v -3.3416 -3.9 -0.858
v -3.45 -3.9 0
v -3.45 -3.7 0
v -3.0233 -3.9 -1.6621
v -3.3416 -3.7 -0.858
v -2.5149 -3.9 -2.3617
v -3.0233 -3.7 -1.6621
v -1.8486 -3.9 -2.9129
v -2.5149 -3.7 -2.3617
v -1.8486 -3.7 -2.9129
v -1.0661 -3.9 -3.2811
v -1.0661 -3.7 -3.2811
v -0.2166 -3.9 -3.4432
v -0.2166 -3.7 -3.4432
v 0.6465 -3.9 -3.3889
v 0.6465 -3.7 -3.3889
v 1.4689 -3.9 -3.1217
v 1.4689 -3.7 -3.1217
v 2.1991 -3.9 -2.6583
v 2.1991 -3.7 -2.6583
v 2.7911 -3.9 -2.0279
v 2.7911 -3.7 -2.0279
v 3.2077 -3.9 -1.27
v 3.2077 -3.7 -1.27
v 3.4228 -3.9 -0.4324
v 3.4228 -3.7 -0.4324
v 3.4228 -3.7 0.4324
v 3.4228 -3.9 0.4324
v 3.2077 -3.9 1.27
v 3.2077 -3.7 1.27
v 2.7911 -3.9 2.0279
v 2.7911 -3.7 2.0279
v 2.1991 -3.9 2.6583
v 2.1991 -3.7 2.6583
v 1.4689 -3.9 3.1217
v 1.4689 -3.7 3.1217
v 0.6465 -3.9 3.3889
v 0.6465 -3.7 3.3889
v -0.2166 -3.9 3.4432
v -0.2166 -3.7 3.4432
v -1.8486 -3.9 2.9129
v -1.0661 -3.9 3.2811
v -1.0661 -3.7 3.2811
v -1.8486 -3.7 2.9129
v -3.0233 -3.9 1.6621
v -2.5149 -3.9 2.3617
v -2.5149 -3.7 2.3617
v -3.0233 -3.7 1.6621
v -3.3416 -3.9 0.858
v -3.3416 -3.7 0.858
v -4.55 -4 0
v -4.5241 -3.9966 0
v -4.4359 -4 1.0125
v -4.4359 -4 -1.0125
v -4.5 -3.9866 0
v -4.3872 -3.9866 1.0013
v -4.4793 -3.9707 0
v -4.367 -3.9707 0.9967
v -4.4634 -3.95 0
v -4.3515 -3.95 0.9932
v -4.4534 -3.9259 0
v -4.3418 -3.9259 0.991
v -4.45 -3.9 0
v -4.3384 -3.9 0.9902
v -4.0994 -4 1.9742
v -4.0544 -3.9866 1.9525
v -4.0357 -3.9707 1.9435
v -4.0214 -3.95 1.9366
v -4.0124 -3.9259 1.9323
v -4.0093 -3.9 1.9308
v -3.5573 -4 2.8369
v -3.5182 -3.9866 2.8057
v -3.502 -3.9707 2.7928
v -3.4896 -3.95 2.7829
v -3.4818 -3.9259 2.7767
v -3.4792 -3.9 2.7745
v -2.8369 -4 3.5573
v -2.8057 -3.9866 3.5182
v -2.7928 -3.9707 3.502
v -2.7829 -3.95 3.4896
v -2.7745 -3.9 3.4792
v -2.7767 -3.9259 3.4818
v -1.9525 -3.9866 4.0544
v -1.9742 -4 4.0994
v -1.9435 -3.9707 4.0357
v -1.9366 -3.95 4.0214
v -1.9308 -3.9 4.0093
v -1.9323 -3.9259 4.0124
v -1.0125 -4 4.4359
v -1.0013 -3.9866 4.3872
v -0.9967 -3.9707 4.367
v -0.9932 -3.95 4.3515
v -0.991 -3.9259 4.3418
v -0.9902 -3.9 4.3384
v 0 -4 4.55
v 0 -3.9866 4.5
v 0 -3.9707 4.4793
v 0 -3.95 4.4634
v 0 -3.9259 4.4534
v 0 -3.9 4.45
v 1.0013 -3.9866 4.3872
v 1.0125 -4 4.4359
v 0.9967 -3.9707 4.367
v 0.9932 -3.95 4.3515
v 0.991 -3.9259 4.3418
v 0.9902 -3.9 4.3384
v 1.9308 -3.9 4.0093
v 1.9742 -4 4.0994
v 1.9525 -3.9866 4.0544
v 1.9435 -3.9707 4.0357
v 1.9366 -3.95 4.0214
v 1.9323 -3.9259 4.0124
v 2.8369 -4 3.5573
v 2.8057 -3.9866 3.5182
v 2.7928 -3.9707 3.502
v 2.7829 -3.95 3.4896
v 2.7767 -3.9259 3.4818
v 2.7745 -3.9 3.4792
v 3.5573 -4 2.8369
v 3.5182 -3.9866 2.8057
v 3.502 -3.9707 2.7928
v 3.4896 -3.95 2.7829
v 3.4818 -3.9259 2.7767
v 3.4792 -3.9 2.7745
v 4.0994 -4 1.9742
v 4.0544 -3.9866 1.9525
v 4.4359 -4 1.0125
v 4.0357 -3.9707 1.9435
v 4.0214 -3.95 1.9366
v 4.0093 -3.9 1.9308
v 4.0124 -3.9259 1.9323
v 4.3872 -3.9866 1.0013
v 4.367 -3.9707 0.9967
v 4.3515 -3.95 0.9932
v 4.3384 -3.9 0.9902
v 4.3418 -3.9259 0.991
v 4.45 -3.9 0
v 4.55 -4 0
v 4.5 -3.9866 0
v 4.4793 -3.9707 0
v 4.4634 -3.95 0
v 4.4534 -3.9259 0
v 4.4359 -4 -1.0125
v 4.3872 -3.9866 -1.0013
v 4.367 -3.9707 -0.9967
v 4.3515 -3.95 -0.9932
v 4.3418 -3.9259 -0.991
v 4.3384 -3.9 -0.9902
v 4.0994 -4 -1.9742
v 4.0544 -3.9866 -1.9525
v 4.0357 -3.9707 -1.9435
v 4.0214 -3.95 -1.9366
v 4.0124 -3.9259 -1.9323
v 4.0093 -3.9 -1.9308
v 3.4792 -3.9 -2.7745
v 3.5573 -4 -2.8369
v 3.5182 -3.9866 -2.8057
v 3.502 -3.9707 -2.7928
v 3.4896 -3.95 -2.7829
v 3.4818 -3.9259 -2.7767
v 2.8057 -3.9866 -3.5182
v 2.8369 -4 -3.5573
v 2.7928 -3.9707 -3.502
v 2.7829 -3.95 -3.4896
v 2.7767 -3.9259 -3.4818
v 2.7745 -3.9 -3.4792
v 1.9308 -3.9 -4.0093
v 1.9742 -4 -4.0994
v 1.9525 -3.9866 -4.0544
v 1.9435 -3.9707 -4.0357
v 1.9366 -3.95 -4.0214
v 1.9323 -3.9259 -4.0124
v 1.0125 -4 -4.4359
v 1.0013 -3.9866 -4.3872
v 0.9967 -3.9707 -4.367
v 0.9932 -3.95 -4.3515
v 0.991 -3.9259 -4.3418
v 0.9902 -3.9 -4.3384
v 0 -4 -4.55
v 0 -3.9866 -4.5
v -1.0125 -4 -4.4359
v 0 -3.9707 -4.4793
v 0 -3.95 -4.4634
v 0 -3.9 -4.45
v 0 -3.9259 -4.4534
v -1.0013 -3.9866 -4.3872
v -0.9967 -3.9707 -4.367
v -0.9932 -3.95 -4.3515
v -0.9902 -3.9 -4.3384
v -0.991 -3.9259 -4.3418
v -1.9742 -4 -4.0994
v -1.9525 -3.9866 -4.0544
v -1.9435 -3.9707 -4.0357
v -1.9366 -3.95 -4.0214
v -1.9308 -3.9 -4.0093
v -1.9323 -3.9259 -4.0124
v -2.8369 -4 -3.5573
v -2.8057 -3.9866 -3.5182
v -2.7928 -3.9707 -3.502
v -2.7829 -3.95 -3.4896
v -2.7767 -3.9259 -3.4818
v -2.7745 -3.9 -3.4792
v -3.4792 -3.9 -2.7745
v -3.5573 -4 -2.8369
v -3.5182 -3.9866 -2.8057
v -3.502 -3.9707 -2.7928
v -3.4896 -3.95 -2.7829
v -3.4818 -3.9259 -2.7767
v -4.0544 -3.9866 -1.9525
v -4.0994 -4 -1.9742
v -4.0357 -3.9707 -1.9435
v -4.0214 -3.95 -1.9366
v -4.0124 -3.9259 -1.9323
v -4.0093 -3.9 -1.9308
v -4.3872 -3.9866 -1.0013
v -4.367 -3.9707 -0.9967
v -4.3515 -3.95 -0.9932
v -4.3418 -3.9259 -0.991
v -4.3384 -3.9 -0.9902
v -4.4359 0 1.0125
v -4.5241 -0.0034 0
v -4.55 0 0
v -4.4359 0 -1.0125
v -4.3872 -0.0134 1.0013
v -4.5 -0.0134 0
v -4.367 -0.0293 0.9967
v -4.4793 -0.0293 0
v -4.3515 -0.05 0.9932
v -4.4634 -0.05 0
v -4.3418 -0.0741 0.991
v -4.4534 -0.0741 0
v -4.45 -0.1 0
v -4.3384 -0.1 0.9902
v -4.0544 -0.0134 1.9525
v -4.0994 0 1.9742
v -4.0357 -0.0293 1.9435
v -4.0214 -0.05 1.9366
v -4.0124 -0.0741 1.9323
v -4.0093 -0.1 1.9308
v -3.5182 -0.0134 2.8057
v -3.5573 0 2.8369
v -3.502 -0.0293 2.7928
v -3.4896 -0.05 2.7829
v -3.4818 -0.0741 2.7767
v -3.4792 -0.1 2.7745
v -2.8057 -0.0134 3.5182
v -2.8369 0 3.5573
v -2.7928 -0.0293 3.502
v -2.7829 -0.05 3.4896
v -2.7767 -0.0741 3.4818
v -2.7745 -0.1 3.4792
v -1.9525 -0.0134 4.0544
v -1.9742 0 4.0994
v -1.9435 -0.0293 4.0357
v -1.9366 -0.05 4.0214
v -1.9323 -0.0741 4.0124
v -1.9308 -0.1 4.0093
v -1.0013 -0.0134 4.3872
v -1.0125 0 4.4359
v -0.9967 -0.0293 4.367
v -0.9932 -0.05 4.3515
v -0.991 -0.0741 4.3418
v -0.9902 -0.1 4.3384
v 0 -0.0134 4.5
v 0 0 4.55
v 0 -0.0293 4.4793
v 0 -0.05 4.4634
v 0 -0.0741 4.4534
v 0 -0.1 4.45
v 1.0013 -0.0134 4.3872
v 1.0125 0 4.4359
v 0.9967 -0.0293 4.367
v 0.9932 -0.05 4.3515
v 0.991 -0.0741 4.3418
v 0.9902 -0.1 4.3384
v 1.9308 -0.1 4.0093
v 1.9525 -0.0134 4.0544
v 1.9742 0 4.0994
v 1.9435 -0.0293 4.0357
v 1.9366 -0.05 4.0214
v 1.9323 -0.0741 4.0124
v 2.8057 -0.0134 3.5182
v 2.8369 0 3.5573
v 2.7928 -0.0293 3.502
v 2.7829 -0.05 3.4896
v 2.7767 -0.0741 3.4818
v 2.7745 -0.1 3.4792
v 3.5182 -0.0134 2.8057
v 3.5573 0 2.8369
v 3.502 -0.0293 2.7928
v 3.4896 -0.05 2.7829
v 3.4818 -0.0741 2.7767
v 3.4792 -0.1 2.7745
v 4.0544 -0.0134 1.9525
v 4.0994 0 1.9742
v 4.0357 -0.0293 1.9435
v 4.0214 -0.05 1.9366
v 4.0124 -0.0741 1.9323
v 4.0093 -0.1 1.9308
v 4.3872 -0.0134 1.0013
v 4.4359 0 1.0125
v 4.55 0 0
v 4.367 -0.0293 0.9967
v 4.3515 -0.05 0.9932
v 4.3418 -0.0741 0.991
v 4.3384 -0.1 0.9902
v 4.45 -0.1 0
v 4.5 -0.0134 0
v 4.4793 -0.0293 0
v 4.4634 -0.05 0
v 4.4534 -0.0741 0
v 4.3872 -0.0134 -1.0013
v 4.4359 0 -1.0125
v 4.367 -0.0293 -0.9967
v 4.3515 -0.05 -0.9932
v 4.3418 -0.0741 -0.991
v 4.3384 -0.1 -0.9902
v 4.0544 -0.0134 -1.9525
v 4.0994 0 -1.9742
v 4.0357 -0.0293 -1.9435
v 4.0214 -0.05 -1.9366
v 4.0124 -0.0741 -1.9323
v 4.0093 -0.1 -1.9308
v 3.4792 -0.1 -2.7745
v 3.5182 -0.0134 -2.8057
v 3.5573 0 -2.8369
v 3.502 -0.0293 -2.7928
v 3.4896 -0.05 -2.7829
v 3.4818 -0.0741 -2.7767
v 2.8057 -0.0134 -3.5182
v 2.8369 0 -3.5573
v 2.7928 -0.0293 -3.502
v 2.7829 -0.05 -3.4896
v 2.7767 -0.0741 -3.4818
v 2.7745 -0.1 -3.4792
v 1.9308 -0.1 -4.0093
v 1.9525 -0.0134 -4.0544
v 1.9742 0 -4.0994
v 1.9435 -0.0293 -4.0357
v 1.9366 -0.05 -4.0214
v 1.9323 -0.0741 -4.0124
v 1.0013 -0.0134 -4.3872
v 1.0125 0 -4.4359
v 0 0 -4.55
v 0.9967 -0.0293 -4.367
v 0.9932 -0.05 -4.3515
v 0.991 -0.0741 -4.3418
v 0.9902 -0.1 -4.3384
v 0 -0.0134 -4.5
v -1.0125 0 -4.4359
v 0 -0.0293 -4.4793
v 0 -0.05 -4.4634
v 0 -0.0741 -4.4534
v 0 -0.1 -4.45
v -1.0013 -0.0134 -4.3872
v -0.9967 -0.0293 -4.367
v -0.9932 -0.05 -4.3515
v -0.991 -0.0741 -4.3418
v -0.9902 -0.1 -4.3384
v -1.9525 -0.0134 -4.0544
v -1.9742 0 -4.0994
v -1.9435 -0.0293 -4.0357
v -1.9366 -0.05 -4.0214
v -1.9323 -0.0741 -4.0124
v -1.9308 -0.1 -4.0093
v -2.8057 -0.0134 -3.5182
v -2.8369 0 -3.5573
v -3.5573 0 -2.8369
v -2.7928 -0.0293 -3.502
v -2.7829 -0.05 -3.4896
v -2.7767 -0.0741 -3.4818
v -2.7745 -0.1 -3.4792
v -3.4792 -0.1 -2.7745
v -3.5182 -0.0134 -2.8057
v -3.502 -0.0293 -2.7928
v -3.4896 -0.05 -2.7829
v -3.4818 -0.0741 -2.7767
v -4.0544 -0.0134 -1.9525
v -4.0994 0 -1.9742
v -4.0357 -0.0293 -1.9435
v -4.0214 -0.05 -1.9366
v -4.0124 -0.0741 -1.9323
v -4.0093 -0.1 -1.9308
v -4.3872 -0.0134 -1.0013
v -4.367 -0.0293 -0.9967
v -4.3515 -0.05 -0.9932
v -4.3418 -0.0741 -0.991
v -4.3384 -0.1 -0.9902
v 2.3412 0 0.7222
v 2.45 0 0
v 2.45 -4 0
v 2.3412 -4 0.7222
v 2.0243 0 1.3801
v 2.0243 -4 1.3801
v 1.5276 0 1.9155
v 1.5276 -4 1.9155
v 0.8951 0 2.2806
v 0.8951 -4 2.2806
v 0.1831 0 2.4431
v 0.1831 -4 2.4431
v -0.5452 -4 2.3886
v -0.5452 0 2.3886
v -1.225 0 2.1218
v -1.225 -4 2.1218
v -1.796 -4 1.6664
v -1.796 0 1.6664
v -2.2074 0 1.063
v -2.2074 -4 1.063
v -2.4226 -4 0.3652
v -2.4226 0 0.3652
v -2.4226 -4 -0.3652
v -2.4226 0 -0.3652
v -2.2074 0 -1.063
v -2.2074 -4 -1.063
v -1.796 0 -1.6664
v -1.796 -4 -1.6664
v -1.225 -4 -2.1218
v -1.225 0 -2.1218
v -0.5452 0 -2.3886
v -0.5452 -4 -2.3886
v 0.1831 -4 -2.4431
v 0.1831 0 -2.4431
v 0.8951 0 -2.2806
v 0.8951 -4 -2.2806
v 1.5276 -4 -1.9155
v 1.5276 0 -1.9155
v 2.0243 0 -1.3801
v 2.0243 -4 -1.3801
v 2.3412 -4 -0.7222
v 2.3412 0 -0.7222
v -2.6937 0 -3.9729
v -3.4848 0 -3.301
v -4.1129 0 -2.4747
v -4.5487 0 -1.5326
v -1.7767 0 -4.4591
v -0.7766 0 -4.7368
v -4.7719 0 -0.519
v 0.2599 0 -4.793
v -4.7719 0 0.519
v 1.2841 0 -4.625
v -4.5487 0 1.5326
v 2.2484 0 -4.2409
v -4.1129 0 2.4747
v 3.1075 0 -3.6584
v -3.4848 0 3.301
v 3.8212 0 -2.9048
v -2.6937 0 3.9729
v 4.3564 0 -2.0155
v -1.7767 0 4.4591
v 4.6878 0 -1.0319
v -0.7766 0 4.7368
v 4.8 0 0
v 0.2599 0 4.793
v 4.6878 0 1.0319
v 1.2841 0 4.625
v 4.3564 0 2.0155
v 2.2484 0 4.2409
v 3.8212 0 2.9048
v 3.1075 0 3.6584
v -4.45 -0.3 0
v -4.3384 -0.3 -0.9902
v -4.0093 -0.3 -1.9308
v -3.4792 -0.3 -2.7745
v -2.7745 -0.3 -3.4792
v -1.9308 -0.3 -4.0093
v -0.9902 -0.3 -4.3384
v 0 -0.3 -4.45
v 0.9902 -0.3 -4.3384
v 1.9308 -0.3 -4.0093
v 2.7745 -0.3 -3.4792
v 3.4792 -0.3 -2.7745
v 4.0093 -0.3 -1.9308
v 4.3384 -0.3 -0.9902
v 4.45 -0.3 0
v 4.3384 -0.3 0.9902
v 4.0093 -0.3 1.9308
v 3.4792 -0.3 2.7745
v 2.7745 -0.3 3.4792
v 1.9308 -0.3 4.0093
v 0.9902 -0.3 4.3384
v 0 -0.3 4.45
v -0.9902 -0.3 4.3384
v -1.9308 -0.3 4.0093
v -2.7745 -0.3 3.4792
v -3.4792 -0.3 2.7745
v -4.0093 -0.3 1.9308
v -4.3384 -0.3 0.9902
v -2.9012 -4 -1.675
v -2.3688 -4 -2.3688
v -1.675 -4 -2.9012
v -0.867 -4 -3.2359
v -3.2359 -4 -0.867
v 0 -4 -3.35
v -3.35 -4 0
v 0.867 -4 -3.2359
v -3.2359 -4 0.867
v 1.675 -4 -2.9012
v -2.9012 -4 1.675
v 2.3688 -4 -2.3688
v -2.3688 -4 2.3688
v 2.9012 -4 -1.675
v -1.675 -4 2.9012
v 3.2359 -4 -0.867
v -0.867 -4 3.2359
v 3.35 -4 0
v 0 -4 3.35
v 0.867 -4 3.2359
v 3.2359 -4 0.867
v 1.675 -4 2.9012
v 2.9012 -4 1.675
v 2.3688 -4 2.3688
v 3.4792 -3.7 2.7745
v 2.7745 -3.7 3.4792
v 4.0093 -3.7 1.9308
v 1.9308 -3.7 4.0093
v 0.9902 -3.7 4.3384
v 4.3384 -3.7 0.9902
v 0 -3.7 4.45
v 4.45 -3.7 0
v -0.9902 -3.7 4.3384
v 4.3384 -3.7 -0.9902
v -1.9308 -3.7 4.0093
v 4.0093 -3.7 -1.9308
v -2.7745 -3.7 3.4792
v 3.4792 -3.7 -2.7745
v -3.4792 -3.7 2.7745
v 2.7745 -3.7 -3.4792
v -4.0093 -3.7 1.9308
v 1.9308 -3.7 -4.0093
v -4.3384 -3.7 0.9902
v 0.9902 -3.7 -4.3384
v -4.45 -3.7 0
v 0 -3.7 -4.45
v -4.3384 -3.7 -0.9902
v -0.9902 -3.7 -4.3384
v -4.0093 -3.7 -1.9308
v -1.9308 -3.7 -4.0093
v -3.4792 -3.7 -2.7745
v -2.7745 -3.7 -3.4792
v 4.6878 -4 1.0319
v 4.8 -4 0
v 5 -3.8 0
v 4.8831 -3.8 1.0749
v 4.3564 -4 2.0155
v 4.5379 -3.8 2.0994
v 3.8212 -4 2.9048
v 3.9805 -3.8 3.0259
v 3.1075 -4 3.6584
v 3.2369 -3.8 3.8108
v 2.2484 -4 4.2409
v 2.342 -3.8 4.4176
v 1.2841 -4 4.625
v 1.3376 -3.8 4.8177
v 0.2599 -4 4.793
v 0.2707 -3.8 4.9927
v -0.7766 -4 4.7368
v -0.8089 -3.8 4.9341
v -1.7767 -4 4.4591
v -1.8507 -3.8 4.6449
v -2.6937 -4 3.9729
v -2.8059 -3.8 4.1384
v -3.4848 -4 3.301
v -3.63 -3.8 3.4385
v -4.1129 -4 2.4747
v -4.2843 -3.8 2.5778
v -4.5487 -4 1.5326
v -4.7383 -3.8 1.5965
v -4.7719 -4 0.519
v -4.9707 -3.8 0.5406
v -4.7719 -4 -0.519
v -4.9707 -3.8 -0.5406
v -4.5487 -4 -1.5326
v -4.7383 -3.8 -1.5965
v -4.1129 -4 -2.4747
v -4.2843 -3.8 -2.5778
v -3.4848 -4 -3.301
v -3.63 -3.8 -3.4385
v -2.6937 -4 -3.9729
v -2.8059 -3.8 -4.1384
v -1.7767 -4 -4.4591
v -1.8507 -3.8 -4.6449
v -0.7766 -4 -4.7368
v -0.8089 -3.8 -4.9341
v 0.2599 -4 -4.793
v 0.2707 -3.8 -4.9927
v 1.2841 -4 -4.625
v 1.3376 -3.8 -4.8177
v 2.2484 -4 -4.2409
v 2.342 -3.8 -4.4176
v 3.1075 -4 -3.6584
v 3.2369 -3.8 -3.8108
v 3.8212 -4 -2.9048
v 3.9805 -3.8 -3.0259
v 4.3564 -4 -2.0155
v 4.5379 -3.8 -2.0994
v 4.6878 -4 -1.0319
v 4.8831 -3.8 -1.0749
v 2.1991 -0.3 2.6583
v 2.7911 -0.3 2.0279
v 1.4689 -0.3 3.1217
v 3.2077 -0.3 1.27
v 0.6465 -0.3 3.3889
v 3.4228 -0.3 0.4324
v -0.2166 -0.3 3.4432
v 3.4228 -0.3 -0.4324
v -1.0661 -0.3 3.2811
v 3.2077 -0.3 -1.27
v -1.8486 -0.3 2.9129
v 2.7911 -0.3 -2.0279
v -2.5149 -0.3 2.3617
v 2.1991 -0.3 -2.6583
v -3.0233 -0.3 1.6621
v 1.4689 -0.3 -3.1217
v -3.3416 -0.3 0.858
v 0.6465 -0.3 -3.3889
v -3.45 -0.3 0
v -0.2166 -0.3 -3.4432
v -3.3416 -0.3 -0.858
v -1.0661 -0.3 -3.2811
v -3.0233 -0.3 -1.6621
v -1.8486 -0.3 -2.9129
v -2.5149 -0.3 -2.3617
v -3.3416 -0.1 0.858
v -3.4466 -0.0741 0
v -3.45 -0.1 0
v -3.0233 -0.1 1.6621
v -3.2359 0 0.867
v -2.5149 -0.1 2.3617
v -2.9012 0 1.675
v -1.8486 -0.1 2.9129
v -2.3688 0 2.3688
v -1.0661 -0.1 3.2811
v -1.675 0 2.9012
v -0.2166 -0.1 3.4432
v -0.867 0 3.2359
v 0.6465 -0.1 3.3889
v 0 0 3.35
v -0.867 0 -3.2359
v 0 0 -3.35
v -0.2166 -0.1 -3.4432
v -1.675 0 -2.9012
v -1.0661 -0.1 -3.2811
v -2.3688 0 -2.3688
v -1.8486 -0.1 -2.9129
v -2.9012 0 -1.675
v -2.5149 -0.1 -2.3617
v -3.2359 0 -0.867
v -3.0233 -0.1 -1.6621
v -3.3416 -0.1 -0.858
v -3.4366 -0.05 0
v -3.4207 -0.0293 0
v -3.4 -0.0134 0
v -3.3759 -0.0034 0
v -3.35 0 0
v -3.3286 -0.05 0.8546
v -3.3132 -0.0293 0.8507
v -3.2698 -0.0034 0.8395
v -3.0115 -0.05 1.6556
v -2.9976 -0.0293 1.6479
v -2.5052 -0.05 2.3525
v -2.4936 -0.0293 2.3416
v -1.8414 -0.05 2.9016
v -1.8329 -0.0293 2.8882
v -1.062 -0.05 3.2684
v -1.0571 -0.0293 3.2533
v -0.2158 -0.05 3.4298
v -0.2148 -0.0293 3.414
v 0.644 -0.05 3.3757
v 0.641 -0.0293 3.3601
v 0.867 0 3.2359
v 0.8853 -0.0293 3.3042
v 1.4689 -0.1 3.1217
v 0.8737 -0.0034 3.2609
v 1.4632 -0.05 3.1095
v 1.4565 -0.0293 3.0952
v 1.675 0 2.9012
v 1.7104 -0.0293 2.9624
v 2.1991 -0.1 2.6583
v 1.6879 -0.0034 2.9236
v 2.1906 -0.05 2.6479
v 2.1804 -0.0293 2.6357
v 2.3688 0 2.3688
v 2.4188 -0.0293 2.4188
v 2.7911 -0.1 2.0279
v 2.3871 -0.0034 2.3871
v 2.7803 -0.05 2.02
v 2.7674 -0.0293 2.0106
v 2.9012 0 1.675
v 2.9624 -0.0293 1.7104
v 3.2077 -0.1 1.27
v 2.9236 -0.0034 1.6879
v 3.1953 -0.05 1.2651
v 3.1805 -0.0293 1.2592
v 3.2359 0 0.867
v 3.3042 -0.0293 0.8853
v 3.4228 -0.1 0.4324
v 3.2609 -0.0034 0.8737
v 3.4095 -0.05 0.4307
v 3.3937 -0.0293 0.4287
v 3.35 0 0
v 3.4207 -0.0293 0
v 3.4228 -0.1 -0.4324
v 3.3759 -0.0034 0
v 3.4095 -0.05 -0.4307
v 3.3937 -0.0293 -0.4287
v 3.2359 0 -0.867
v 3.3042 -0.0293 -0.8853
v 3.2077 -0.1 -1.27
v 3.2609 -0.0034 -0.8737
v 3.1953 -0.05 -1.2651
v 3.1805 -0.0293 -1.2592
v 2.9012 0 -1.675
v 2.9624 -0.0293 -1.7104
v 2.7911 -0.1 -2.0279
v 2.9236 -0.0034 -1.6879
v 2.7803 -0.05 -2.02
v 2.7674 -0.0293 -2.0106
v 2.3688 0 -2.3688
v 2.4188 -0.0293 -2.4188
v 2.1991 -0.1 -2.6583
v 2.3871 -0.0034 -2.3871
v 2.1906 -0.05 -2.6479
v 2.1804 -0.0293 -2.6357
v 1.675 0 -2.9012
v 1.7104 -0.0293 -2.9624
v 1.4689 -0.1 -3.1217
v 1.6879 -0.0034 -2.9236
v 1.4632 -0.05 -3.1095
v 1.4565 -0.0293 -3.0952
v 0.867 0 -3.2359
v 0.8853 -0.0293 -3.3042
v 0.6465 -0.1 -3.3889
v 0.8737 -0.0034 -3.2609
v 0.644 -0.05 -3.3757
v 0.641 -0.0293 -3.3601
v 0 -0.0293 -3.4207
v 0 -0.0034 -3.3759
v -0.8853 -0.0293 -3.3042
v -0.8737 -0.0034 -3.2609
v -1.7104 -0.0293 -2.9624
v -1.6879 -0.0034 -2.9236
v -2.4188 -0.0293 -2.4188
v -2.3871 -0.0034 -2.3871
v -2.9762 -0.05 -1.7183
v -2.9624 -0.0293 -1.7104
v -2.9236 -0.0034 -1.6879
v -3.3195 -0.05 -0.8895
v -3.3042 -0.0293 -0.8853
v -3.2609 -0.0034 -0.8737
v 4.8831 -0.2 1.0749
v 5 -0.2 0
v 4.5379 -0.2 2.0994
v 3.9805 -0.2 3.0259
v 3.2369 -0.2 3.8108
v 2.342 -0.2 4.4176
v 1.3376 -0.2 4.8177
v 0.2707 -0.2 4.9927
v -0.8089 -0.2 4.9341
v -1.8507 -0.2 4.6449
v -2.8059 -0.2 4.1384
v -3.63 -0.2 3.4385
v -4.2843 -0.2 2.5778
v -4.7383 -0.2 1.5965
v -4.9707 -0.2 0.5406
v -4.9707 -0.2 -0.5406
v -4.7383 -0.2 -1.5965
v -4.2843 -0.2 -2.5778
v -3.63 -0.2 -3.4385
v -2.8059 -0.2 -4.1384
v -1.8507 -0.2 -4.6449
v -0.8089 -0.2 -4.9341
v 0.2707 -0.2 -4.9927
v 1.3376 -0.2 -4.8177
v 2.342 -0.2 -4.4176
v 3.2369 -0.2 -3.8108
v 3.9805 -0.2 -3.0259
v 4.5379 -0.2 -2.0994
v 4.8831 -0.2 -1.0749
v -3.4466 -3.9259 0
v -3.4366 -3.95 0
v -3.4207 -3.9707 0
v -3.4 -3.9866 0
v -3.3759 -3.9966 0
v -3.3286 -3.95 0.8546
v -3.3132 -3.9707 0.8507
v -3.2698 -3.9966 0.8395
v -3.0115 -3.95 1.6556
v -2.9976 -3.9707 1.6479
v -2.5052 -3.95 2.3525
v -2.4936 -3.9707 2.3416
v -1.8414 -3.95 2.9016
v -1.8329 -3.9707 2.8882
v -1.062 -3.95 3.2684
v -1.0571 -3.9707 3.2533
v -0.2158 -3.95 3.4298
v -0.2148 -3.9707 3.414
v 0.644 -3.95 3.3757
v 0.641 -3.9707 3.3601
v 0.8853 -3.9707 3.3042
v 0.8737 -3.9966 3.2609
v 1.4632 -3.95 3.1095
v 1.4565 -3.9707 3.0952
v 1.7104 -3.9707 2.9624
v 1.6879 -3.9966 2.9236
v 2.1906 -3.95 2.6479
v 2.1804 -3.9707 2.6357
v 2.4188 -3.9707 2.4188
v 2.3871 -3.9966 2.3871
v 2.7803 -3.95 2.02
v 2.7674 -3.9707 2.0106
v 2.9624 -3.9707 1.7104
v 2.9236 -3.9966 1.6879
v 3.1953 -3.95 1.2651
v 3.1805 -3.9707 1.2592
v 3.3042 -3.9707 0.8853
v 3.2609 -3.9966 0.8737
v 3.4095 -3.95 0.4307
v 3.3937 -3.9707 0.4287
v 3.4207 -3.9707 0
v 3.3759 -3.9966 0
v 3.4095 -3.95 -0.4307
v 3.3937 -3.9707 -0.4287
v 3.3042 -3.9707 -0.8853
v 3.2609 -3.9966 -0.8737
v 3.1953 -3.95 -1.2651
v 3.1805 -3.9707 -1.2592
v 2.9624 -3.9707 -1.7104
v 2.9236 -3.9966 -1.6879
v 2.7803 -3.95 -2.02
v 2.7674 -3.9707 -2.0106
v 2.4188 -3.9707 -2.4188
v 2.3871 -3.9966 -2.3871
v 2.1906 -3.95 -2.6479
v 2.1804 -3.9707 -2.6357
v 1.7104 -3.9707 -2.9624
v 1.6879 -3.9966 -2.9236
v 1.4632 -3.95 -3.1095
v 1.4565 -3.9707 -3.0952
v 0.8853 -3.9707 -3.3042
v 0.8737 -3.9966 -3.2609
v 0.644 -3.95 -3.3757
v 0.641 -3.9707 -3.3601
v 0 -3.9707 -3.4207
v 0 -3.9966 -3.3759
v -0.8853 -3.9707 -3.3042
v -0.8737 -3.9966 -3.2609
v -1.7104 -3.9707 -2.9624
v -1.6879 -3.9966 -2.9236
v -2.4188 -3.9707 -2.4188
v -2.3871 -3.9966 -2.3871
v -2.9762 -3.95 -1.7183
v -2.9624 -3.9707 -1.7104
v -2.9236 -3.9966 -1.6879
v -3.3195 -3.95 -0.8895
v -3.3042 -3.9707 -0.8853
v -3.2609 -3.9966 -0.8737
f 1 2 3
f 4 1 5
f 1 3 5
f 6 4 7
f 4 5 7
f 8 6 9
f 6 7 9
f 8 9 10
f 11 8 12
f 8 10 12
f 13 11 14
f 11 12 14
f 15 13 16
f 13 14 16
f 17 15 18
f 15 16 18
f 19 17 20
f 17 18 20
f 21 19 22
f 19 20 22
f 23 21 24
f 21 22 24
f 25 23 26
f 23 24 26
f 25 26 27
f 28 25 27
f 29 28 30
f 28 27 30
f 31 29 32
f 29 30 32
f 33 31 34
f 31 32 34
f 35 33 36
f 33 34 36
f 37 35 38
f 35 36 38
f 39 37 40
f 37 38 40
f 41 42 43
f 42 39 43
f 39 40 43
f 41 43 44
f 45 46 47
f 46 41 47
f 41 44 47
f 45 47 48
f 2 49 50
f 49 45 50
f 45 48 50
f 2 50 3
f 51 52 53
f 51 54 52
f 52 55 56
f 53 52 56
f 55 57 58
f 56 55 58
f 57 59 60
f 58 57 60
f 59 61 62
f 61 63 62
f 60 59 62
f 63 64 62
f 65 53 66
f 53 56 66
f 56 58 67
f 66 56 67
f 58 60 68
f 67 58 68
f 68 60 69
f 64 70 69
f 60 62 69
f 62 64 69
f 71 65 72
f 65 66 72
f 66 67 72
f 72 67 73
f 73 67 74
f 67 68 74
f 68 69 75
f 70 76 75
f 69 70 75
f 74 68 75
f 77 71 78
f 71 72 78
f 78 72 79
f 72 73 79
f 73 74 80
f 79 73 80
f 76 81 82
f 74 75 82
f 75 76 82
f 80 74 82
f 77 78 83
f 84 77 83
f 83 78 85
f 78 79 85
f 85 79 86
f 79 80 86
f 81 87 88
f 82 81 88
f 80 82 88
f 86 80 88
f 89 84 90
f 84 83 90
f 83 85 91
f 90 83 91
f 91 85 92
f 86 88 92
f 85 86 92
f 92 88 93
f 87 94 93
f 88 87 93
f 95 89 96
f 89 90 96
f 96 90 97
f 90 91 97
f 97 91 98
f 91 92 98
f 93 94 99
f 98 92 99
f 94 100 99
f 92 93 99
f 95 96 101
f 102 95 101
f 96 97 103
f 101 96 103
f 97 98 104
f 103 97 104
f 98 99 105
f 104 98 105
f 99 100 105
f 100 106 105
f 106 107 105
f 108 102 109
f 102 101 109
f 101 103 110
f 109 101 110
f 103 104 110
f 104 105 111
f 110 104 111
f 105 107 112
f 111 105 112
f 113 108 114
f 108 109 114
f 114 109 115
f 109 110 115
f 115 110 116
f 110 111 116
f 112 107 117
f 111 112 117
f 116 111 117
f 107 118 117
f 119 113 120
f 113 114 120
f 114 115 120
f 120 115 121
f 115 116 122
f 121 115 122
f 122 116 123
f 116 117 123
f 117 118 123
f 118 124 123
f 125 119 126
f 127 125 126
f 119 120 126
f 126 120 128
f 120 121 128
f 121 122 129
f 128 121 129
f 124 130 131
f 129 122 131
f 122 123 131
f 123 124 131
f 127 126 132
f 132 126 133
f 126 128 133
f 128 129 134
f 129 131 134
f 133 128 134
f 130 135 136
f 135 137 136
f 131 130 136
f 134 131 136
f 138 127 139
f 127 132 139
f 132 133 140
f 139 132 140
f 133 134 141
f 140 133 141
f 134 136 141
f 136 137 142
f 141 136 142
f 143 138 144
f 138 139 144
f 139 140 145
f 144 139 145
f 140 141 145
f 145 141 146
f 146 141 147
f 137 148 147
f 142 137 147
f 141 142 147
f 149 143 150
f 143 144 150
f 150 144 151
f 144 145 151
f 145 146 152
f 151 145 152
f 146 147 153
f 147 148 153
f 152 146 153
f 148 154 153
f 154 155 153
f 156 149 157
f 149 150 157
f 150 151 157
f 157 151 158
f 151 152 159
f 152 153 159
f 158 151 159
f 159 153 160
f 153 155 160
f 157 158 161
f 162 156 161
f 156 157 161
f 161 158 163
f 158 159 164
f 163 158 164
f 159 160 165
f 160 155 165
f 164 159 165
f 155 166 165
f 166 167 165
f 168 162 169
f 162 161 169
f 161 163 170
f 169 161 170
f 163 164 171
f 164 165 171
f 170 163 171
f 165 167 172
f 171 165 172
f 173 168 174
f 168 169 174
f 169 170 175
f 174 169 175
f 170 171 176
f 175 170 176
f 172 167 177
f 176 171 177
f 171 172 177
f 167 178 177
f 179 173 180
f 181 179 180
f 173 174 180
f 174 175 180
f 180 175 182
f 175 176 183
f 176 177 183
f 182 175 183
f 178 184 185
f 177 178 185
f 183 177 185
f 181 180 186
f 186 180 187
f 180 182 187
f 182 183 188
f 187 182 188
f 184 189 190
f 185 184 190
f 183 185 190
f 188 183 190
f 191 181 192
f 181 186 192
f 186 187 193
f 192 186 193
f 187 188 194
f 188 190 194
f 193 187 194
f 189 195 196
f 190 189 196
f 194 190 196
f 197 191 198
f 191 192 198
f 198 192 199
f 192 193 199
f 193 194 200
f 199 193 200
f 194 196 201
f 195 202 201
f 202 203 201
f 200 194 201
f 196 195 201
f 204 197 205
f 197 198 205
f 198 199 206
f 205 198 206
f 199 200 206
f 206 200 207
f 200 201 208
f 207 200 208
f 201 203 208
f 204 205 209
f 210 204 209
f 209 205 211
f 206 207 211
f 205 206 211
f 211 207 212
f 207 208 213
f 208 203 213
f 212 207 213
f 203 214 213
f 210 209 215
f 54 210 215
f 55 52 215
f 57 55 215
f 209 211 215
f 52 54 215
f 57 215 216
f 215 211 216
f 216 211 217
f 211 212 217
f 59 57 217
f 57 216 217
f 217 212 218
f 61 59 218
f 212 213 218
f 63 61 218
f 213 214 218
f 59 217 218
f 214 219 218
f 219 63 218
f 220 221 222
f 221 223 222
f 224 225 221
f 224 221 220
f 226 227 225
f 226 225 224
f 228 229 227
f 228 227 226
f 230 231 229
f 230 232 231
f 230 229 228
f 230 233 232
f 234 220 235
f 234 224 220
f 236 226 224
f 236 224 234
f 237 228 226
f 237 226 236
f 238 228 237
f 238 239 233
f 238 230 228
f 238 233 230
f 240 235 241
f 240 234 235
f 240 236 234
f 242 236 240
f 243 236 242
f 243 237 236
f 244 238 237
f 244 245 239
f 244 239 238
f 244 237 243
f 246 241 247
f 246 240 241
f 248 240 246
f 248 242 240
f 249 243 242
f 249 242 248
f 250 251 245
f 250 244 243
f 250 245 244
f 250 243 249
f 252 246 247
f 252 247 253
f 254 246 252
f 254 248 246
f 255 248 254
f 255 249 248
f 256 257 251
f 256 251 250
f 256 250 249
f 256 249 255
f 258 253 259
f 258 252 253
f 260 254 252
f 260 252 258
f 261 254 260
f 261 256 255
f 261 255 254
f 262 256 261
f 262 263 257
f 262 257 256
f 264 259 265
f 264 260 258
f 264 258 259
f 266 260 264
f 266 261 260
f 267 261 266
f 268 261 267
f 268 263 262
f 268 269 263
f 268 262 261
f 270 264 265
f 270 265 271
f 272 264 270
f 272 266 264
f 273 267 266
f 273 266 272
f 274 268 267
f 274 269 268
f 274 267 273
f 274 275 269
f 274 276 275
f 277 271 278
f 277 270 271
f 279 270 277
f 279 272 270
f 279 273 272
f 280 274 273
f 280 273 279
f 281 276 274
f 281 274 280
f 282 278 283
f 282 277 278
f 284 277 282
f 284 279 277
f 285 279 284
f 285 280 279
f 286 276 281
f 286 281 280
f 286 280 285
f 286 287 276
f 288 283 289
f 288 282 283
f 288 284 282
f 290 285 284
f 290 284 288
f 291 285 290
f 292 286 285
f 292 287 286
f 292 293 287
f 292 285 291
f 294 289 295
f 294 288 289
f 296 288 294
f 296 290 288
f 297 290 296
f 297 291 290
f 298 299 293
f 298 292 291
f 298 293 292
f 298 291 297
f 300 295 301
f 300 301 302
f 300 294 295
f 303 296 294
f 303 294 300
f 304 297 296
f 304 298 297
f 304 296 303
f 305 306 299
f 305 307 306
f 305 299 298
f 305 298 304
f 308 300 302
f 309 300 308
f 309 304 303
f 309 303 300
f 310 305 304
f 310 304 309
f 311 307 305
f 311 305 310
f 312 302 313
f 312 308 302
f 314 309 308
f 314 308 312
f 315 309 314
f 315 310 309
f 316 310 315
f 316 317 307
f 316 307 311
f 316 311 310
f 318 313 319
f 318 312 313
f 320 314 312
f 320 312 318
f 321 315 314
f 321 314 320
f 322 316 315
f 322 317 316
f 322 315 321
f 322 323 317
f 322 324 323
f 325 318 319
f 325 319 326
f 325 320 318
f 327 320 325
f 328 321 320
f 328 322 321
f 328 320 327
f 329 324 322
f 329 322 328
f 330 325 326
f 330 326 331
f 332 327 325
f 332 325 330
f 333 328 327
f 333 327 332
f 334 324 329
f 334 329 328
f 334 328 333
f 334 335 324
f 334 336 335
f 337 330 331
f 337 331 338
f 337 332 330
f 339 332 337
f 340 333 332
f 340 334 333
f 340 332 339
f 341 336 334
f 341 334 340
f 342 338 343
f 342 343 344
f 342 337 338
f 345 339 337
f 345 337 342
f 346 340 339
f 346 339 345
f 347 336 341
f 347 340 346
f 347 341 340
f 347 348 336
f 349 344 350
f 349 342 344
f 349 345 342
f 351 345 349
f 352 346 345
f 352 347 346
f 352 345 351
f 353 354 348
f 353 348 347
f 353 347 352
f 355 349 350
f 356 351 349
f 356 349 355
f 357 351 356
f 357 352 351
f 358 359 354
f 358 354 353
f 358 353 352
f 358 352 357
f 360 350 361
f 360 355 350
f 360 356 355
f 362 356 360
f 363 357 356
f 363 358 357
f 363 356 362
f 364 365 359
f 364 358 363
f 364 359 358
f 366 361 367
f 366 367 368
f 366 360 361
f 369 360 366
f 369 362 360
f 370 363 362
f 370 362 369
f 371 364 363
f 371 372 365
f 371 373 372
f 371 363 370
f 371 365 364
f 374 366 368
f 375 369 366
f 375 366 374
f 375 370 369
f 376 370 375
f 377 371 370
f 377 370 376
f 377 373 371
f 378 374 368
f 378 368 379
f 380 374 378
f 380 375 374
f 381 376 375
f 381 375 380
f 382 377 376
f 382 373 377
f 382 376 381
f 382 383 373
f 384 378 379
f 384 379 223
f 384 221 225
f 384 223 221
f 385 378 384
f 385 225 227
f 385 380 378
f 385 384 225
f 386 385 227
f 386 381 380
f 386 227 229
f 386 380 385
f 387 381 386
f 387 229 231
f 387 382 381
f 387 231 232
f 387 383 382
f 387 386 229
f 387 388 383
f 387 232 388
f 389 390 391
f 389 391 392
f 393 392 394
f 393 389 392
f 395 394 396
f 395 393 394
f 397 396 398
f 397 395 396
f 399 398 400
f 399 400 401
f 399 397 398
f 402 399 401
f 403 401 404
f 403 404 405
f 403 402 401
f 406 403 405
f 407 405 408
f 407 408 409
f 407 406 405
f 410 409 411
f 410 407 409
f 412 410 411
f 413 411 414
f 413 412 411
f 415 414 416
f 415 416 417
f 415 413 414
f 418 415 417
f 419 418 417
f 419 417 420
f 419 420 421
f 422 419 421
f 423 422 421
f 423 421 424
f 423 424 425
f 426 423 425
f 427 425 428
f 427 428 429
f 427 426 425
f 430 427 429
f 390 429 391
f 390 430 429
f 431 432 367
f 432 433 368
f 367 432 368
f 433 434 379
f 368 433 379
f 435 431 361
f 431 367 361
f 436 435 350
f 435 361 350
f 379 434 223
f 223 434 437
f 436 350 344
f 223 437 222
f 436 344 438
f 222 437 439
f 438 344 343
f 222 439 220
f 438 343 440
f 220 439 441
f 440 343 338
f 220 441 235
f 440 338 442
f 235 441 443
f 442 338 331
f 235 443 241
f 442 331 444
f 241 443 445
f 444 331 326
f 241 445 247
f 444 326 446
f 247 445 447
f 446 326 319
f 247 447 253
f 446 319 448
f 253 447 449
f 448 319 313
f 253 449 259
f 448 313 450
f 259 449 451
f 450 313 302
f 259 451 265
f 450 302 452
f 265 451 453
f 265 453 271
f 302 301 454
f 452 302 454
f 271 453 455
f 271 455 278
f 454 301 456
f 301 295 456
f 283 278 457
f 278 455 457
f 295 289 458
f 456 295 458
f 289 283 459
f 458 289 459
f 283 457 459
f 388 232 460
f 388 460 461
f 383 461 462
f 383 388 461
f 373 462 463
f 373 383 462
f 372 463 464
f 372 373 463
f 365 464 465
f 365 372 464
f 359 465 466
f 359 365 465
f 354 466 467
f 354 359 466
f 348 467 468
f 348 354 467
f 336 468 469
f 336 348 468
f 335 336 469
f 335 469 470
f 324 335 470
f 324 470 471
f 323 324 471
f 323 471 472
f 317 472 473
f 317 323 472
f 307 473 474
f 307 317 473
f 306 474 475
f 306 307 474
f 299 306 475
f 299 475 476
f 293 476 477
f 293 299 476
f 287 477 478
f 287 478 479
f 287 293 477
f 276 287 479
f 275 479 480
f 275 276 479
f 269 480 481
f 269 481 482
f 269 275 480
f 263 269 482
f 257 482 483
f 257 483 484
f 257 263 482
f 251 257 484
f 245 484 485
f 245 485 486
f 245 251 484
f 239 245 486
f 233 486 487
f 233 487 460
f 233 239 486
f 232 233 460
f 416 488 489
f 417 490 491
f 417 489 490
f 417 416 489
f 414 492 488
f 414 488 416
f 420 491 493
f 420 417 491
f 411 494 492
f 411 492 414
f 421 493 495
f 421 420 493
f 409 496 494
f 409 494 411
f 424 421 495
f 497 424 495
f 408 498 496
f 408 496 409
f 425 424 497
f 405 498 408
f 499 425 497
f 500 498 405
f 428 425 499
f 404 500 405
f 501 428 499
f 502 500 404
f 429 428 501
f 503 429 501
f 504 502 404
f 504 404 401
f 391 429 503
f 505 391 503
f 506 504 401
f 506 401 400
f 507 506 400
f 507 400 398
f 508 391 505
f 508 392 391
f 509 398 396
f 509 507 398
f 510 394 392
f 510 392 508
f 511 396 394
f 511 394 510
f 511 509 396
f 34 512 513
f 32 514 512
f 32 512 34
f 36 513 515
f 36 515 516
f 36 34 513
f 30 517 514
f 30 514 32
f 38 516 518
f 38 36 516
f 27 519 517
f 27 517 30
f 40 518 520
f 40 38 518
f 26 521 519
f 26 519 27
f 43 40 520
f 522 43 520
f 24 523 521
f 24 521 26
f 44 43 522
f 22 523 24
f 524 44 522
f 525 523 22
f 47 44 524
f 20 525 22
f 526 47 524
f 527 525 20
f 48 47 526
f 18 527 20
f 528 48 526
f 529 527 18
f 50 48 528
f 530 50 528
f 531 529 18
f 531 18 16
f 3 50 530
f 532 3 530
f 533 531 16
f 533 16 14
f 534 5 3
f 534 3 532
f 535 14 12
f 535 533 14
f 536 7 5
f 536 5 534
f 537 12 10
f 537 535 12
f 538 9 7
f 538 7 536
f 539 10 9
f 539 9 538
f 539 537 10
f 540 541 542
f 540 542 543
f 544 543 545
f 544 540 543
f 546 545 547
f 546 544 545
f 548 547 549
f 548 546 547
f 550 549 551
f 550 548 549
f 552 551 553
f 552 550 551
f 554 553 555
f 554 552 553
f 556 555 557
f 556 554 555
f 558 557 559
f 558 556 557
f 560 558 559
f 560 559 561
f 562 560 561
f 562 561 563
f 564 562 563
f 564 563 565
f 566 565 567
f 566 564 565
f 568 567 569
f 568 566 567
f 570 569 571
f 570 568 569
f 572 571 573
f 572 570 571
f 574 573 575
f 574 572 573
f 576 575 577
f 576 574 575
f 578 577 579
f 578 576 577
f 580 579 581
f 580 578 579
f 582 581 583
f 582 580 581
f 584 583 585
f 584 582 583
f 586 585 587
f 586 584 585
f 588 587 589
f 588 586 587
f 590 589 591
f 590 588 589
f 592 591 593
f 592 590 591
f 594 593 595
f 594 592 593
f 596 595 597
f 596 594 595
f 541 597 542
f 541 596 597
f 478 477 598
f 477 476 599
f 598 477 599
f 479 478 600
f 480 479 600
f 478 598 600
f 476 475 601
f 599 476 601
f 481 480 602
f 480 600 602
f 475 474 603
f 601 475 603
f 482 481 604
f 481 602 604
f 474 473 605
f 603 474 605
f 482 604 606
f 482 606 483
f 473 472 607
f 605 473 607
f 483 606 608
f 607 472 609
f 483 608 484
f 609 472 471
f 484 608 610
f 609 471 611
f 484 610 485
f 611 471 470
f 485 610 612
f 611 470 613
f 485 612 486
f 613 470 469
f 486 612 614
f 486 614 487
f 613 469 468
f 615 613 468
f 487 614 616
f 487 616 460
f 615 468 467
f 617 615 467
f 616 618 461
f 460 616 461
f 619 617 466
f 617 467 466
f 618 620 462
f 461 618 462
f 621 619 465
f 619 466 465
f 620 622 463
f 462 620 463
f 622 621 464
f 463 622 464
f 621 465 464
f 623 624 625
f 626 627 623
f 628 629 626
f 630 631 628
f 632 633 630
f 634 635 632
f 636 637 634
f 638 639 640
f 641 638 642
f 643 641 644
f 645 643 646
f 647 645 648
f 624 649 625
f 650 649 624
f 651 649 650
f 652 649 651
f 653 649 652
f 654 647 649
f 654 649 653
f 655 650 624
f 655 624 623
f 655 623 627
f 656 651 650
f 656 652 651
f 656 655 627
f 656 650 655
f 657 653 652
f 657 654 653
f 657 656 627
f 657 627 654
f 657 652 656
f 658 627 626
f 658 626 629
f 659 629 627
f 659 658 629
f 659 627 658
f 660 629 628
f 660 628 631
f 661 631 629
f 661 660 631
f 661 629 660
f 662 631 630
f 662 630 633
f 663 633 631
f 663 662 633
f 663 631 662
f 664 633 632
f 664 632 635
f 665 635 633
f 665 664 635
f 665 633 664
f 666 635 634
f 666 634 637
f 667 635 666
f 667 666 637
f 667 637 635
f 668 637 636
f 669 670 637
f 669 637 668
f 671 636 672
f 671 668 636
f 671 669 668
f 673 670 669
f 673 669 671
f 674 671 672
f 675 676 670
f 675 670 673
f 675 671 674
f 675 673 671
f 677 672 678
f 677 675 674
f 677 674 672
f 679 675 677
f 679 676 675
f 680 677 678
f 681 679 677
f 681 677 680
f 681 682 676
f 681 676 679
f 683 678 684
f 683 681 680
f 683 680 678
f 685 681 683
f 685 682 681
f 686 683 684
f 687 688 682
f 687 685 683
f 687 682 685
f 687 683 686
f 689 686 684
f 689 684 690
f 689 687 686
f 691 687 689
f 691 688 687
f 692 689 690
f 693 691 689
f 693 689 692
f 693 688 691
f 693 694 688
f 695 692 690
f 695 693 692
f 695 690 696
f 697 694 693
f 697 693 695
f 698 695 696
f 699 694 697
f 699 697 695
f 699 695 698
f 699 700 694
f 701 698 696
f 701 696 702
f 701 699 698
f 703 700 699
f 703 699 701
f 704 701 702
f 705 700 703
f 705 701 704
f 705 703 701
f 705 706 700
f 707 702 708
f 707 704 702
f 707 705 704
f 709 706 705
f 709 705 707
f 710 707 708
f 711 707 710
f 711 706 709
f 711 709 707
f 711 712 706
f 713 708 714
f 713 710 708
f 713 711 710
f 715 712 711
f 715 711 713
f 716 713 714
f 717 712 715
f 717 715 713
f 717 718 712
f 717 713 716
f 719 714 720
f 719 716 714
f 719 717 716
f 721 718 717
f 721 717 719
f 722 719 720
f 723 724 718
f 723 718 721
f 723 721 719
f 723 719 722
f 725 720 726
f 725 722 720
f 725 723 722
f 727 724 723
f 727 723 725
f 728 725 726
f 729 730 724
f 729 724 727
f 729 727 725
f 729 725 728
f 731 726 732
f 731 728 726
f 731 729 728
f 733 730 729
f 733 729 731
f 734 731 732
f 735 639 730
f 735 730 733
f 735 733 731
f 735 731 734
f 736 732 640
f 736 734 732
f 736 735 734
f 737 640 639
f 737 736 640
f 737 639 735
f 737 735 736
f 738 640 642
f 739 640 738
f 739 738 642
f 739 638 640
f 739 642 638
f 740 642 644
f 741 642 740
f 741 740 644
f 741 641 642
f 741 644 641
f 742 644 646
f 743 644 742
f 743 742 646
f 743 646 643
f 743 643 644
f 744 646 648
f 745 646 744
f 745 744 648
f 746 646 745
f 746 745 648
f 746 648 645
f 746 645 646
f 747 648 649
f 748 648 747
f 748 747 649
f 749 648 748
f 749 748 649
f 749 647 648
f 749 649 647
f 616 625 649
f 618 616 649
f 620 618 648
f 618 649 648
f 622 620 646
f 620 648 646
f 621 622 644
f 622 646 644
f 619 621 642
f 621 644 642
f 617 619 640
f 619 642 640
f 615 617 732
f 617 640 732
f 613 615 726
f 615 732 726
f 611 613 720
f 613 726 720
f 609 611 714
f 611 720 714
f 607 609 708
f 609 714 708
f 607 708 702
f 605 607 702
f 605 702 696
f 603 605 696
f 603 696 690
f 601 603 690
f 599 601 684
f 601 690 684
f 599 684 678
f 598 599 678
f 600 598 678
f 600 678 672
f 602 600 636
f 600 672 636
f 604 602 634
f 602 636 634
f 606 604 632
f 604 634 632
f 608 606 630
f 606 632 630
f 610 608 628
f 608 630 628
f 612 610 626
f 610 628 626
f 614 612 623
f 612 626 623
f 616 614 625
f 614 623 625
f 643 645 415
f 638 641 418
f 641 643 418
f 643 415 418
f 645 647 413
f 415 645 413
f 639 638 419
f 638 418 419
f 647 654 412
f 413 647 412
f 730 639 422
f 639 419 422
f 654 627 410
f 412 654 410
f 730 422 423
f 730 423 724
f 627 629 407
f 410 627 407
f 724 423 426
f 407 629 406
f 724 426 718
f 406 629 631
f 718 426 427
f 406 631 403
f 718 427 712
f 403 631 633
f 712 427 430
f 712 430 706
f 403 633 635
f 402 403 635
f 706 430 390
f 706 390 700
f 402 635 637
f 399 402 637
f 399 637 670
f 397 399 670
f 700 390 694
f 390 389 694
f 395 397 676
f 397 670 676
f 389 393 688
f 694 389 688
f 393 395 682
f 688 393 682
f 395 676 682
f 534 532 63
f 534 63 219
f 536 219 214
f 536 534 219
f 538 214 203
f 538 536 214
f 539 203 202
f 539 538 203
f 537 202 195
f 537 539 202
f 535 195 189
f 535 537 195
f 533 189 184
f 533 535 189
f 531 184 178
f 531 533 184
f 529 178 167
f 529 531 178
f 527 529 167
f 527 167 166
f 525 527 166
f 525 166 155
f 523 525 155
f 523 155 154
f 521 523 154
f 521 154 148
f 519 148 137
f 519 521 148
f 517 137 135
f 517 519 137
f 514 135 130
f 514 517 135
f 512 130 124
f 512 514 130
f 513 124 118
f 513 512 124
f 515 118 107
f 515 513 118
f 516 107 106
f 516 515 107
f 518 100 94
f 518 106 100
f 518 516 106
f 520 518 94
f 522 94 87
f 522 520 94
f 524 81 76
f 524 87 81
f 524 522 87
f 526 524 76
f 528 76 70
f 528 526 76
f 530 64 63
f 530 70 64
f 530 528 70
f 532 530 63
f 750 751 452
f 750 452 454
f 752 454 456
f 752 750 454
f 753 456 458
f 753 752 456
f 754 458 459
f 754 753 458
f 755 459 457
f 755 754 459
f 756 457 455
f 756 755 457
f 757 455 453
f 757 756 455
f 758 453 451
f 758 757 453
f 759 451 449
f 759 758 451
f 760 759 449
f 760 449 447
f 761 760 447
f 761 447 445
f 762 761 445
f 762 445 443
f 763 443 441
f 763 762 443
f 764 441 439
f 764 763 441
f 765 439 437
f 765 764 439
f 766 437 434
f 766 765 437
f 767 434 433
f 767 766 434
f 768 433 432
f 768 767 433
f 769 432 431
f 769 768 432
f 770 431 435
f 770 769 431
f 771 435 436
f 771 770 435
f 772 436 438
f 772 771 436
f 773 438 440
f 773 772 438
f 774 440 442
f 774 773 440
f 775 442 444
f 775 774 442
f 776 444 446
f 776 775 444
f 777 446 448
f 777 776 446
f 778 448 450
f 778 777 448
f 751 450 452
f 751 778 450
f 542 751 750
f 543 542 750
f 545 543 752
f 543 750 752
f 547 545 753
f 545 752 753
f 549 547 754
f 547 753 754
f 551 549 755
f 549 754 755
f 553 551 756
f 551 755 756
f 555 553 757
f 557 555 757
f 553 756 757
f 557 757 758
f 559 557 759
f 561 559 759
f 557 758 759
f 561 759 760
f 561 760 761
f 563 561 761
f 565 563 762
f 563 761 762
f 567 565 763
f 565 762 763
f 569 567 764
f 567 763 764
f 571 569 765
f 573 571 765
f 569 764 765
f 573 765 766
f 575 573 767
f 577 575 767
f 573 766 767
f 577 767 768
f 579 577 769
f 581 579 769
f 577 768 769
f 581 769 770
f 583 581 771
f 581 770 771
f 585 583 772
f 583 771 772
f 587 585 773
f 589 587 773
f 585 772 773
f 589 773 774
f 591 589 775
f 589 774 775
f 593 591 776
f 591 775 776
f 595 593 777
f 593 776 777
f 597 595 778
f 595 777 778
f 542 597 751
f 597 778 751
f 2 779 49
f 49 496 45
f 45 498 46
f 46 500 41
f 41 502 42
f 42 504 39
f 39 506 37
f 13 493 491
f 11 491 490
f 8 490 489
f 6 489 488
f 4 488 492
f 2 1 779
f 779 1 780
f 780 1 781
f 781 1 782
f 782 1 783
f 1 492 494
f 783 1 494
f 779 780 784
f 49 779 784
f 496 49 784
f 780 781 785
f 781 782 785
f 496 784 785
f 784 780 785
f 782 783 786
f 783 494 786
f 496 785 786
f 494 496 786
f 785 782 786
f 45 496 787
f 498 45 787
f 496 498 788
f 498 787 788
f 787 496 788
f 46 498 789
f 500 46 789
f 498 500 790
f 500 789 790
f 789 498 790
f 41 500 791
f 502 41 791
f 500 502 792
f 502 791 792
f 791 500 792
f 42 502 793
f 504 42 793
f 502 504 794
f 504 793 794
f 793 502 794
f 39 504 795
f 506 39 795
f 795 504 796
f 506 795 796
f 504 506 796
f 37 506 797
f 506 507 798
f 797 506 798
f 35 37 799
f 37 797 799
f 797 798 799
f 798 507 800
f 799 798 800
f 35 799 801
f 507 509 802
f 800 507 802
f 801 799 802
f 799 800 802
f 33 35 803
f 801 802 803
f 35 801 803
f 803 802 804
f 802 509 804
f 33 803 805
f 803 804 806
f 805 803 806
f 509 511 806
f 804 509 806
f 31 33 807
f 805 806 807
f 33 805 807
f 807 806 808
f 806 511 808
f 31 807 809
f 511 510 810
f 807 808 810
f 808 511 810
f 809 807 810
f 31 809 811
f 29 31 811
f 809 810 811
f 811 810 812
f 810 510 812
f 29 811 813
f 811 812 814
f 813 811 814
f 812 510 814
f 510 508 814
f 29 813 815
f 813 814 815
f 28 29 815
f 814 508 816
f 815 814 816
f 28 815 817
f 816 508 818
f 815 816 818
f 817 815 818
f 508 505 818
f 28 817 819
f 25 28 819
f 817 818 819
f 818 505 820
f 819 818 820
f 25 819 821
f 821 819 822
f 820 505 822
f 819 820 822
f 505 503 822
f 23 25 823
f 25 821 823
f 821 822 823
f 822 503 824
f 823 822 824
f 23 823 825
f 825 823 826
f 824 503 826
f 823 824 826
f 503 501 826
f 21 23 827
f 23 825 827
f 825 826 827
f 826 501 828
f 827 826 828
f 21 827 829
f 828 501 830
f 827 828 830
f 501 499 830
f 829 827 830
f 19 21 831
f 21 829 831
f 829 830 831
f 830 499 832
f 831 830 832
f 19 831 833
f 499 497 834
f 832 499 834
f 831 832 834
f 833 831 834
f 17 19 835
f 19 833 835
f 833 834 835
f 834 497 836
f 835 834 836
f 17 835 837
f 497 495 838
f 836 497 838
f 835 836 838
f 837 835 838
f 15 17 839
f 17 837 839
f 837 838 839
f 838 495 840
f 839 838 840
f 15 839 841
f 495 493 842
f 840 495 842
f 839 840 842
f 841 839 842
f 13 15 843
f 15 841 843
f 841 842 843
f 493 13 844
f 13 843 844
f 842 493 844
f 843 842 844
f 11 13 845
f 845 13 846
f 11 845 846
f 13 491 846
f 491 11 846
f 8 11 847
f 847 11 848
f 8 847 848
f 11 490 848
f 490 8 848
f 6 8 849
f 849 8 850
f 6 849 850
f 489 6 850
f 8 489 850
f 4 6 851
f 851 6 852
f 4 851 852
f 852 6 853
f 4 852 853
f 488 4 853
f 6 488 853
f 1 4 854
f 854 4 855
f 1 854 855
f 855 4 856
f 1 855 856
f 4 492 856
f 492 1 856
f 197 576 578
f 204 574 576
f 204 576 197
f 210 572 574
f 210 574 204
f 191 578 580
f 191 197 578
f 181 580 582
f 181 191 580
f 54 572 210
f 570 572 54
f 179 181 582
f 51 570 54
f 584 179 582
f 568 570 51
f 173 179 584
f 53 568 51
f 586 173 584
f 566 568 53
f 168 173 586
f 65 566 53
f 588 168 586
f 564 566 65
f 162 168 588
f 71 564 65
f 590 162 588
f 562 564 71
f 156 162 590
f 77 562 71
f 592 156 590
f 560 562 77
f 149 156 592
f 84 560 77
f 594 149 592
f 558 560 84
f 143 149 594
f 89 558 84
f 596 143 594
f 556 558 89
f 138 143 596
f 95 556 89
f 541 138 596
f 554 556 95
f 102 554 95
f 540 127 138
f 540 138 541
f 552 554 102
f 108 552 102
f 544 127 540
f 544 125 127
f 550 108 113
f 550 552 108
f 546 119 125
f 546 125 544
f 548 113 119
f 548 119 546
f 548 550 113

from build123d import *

# Parameters (mm, degrees)
F0_R     = 5
F0_R_2   = 2.45
F1_DEPTH = 4
F3_W     = 1
F3_H     = 1
F5_R     = 0.1
F6_SIZE  = 0.2


with BuildPart() as f1:
    # F0 (on Front) → F1 (new body)
    with BuildSketch(Plane.XZ):
        Circle(F0_R)
        Circle(F0_R_2, mode=Mode.SUBTRACT)
    extrude(amount=F1_DEPTH)

    # F3 (on Top) → F4 (revolve, cut)
    with BuildSketch(Plane.XY):
        with Locations((-3.95, 0.2)):
            Rectangle(F3_W, F3_H)
        with Locations((-3.95, -4.2)):
            Rectangle(F3_W, F3_H)
    revolve(axis=Axis((0, -5.5422200821, 0), (0, -1, 0)), mode=Mode.SUBTRACT)

    # F5
    f5_edges = [f1.edges().sort_by_distance(p)[0] for p in [
        (4.45, 0, 0),
        (3.45, 0, 0),
        (4.45, -4, 0),
        (3.45, -4, 0),
    ]]
    fillet(f5_edges, radius=F5_R)

    # F6
    f6_edges = [f1.edges().sort_by_distance(p)[0] for p in [
        (-5, -4, 0),
        (-5, 0, 0),
    ]]
    chamfer(f6_edges, length=F6_SIZE)


solid = f1.part
